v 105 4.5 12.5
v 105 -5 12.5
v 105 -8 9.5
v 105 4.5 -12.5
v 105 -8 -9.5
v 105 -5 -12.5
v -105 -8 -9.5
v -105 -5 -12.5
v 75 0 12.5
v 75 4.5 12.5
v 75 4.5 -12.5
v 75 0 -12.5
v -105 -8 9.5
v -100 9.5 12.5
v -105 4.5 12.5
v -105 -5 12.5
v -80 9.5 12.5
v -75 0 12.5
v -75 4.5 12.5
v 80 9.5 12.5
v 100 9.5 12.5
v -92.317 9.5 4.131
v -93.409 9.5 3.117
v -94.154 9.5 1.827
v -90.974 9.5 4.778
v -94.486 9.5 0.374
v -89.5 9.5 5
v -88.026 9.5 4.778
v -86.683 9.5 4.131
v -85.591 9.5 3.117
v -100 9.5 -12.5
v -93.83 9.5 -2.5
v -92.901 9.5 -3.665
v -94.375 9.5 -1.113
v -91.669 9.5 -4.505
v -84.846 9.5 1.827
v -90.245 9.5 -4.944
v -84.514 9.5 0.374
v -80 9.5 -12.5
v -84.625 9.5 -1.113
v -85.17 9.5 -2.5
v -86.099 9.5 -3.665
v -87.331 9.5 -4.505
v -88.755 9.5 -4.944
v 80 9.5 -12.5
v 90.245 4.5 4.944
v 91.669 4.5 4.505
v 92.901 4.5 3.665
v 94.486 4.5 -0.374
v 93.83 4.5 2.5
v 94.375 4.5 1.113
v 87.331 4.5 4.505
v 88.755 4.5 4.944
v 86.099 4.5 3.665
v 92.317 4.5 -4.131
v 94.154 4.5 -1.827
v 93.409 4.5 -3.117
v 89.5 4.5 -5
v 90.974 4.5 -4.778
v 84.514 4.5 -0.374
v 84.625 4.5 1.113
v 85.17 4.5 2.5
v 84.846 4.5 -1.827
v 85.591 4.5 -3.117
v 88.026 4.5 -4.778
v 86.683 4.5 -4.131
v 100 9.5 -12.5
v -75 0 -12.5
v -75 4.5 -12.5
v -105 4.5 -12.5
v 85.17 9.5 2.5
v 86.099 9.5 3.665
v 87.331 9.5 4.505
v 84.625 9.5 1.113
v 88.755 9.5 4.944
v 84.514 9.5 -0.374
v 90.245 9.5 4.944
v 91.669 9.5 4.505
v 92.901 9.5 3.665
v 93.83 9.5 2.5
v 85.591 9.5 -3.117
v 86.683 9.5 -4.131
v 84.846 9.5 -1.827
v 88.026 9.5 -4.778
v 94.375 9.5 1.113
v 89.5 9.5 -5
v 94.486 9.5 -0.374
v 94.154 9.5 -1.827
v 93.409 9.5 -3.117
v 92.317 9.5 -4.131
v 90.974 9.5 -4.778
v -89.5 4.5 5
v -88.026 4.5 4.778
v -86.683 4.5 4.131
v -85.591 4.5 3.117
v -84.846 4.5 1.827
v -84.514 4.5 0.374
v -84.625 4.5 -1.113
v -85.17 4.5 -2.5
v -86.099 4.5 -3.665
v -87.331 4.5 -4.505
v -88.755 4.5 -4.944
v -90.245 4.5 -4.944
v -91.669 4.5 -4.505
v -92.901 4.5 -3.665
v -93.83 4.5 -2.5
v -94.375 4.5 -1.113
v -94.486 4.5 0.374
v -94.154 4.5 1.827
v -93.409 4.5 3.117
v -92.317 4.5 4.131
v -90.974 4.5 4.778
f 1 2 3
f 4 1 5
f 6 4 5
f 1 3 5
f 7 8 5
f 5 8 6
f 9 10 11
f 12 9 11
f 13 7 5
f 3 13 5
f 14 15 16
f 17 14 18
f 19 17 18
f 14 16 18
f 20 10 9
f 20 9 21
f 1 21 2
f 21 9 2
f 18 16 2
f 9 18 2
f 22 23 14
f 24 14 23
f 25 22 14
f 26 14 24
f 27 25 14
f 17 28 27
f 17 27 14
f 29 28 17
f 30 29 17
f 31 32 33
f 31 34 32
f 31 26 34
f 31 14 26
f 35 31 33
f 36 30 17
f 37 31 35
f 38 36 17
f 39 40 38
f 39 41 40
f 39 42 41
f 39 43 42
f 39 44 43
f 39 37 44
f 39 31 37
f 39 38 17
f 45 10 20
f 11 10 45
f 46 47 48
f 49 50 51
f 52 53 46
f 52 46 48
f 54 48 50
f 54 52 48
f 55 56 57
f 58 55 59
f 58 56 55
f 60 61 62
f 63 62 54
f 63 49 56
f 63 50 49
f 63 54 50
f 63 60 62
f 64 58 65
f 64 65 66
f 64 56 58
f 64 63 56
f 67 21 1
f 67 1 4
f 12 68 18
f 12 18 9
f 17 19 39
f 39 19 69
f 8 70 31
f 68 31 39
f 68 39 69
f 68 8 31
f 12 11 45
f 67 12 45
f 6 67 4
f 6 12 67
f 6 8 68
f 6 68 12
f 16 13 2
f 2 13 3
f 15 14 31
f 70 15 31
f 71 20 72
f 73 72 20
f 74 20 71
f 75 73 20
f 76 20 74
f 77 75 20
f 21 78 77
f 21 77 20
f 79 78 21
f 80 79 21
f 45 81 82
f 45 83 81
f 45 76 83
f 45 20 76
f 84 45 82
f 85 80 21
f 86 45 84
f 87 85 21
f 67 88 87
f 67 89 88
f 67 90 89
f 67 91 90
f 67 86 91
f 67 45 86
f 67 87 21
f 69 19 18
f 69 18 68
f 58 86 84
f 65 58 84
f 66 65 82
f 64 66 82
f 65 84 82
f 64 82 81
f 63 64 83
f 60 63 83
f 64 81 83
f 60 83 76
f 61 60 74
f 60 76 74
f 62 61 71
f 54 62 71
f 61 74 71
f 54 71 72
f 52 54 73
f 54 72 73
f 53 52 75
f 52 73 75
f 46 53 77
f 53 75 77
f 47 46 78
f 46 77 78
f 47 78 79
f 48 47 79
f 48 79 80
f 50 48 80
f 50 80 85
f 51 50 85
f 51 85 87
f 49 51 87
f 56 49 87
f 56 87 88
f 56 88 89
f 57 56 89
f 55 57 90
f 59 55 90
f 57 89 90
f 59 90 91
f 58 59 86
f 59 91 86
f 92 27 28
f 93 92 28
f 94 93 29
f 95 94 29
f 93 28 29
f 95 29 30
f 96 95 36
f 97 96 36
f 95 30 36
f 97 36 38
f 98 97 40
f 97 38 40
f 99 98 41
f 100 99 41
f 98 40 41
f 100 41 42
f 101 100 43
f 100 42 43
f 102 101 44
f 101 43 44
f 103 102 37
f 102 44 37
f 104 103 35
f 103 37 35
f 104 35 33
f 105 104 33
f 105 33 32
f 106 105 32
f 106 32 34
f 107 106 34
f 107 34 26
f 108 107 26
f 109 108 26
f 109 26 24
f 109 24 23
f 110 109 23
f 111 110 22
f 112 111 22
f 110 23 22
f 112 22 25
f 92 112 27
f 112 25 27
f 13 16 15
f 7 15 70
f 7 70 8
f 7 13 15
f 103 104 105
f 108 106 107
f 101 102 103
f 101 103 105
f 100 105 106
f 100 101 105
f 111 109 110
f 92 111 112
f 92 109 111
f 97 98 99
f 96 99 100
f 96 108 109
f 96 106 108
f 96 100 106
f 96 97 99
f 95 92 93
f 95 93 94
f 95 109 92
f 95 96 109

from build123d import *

# Parameters (mm, degrees)
EXTRUDE_1_DEPTH      = 9.5
EXTRUDE_1_DEPTH_BACK = 8
SKETCH_1_W           = 210
SKETCH_1_H           = 25
SKETCH_2_W           = 150
SKETCH_2_H           = 25
CUT_EXTRUDE_1_DEPTH  = 9.5
SKETCH_3_R           = 5
CUT_EXTRUDE_2_DEPTH  = 5
CHAMFER_1_SIZE       = 5
CHAMFER_2_SIZE       = 3


with BuildPart() as part:
    # 草图1 → 凸台-拉伸1 (new, two sides: drawn at the far end of the back side and taken through both)
    with BuildSketch(Plane(origin=(0, 0, 0), x_dir=(1, 0, 0), z_dir=(0, 1, 0)).offset(-EXTRUDE_1_DEPTH_BACK)):
        Rectangle(SKETCH_1_W, SKETCH_1_H)
    extrude(amount=EXTRUDE_1_DEPTH + EXTRUDE_1_DEPTH_BACK)

    # 草图2 → 切除-拉伸1 (cut)
    with BuildSketch(Plane(origin=(0, 9.5, 0), x_dir=(1, 0, 0), z_dir=(0, 1, 0))):
        Rectangle(SKETCH_2_W, SKETCH_2_H)
    extrude(amount=-CUT_EXTRUDE_1_DEPTH, mode=Mode.SUBTRACT)

    # 草图3 → 切除-拉伸2 (cut)
    with BuildSketch(Plane(origin=(0, 9.5, 0), x_dir=(1, 0, 0), z_dir=(0, 1, 0))):
        with Locations(Location((-89.5, 0, 0), (0, 0, 270))):
            Circle(SKETCH_3_R)
        with Locations(Location((89.5, 0, 0), (0, 0, 90))):
            Circle(SKETCH_3_R)
    extrude(amount=-CUT_EXTRUDE_2_DEPTH, mode=Mode.SUBTRACT)

    # 倒角1
    chamfer_1_edges = [part.edges().sort_by_distance(p)[0] for p in [
        (-105, 9.5, 0),
        (105, 9.5, 0),
        (-75, 9.5, 0),
        (75, 9.5, 0),
    ]]
    chamfer(chamfer_1_edges, length=CHAMFER_1_SIZE)

    # 倒角2
    chamfer_2_edges = [part.edges().sort_by_distance(p)[0] for p in [
        (0, -8, -12.5),
        (0, -8, 12.5),
    ]]
    chamfer(chamfer_2_edges, length=CHAMFER_2_SIZE)


solid = part.part
